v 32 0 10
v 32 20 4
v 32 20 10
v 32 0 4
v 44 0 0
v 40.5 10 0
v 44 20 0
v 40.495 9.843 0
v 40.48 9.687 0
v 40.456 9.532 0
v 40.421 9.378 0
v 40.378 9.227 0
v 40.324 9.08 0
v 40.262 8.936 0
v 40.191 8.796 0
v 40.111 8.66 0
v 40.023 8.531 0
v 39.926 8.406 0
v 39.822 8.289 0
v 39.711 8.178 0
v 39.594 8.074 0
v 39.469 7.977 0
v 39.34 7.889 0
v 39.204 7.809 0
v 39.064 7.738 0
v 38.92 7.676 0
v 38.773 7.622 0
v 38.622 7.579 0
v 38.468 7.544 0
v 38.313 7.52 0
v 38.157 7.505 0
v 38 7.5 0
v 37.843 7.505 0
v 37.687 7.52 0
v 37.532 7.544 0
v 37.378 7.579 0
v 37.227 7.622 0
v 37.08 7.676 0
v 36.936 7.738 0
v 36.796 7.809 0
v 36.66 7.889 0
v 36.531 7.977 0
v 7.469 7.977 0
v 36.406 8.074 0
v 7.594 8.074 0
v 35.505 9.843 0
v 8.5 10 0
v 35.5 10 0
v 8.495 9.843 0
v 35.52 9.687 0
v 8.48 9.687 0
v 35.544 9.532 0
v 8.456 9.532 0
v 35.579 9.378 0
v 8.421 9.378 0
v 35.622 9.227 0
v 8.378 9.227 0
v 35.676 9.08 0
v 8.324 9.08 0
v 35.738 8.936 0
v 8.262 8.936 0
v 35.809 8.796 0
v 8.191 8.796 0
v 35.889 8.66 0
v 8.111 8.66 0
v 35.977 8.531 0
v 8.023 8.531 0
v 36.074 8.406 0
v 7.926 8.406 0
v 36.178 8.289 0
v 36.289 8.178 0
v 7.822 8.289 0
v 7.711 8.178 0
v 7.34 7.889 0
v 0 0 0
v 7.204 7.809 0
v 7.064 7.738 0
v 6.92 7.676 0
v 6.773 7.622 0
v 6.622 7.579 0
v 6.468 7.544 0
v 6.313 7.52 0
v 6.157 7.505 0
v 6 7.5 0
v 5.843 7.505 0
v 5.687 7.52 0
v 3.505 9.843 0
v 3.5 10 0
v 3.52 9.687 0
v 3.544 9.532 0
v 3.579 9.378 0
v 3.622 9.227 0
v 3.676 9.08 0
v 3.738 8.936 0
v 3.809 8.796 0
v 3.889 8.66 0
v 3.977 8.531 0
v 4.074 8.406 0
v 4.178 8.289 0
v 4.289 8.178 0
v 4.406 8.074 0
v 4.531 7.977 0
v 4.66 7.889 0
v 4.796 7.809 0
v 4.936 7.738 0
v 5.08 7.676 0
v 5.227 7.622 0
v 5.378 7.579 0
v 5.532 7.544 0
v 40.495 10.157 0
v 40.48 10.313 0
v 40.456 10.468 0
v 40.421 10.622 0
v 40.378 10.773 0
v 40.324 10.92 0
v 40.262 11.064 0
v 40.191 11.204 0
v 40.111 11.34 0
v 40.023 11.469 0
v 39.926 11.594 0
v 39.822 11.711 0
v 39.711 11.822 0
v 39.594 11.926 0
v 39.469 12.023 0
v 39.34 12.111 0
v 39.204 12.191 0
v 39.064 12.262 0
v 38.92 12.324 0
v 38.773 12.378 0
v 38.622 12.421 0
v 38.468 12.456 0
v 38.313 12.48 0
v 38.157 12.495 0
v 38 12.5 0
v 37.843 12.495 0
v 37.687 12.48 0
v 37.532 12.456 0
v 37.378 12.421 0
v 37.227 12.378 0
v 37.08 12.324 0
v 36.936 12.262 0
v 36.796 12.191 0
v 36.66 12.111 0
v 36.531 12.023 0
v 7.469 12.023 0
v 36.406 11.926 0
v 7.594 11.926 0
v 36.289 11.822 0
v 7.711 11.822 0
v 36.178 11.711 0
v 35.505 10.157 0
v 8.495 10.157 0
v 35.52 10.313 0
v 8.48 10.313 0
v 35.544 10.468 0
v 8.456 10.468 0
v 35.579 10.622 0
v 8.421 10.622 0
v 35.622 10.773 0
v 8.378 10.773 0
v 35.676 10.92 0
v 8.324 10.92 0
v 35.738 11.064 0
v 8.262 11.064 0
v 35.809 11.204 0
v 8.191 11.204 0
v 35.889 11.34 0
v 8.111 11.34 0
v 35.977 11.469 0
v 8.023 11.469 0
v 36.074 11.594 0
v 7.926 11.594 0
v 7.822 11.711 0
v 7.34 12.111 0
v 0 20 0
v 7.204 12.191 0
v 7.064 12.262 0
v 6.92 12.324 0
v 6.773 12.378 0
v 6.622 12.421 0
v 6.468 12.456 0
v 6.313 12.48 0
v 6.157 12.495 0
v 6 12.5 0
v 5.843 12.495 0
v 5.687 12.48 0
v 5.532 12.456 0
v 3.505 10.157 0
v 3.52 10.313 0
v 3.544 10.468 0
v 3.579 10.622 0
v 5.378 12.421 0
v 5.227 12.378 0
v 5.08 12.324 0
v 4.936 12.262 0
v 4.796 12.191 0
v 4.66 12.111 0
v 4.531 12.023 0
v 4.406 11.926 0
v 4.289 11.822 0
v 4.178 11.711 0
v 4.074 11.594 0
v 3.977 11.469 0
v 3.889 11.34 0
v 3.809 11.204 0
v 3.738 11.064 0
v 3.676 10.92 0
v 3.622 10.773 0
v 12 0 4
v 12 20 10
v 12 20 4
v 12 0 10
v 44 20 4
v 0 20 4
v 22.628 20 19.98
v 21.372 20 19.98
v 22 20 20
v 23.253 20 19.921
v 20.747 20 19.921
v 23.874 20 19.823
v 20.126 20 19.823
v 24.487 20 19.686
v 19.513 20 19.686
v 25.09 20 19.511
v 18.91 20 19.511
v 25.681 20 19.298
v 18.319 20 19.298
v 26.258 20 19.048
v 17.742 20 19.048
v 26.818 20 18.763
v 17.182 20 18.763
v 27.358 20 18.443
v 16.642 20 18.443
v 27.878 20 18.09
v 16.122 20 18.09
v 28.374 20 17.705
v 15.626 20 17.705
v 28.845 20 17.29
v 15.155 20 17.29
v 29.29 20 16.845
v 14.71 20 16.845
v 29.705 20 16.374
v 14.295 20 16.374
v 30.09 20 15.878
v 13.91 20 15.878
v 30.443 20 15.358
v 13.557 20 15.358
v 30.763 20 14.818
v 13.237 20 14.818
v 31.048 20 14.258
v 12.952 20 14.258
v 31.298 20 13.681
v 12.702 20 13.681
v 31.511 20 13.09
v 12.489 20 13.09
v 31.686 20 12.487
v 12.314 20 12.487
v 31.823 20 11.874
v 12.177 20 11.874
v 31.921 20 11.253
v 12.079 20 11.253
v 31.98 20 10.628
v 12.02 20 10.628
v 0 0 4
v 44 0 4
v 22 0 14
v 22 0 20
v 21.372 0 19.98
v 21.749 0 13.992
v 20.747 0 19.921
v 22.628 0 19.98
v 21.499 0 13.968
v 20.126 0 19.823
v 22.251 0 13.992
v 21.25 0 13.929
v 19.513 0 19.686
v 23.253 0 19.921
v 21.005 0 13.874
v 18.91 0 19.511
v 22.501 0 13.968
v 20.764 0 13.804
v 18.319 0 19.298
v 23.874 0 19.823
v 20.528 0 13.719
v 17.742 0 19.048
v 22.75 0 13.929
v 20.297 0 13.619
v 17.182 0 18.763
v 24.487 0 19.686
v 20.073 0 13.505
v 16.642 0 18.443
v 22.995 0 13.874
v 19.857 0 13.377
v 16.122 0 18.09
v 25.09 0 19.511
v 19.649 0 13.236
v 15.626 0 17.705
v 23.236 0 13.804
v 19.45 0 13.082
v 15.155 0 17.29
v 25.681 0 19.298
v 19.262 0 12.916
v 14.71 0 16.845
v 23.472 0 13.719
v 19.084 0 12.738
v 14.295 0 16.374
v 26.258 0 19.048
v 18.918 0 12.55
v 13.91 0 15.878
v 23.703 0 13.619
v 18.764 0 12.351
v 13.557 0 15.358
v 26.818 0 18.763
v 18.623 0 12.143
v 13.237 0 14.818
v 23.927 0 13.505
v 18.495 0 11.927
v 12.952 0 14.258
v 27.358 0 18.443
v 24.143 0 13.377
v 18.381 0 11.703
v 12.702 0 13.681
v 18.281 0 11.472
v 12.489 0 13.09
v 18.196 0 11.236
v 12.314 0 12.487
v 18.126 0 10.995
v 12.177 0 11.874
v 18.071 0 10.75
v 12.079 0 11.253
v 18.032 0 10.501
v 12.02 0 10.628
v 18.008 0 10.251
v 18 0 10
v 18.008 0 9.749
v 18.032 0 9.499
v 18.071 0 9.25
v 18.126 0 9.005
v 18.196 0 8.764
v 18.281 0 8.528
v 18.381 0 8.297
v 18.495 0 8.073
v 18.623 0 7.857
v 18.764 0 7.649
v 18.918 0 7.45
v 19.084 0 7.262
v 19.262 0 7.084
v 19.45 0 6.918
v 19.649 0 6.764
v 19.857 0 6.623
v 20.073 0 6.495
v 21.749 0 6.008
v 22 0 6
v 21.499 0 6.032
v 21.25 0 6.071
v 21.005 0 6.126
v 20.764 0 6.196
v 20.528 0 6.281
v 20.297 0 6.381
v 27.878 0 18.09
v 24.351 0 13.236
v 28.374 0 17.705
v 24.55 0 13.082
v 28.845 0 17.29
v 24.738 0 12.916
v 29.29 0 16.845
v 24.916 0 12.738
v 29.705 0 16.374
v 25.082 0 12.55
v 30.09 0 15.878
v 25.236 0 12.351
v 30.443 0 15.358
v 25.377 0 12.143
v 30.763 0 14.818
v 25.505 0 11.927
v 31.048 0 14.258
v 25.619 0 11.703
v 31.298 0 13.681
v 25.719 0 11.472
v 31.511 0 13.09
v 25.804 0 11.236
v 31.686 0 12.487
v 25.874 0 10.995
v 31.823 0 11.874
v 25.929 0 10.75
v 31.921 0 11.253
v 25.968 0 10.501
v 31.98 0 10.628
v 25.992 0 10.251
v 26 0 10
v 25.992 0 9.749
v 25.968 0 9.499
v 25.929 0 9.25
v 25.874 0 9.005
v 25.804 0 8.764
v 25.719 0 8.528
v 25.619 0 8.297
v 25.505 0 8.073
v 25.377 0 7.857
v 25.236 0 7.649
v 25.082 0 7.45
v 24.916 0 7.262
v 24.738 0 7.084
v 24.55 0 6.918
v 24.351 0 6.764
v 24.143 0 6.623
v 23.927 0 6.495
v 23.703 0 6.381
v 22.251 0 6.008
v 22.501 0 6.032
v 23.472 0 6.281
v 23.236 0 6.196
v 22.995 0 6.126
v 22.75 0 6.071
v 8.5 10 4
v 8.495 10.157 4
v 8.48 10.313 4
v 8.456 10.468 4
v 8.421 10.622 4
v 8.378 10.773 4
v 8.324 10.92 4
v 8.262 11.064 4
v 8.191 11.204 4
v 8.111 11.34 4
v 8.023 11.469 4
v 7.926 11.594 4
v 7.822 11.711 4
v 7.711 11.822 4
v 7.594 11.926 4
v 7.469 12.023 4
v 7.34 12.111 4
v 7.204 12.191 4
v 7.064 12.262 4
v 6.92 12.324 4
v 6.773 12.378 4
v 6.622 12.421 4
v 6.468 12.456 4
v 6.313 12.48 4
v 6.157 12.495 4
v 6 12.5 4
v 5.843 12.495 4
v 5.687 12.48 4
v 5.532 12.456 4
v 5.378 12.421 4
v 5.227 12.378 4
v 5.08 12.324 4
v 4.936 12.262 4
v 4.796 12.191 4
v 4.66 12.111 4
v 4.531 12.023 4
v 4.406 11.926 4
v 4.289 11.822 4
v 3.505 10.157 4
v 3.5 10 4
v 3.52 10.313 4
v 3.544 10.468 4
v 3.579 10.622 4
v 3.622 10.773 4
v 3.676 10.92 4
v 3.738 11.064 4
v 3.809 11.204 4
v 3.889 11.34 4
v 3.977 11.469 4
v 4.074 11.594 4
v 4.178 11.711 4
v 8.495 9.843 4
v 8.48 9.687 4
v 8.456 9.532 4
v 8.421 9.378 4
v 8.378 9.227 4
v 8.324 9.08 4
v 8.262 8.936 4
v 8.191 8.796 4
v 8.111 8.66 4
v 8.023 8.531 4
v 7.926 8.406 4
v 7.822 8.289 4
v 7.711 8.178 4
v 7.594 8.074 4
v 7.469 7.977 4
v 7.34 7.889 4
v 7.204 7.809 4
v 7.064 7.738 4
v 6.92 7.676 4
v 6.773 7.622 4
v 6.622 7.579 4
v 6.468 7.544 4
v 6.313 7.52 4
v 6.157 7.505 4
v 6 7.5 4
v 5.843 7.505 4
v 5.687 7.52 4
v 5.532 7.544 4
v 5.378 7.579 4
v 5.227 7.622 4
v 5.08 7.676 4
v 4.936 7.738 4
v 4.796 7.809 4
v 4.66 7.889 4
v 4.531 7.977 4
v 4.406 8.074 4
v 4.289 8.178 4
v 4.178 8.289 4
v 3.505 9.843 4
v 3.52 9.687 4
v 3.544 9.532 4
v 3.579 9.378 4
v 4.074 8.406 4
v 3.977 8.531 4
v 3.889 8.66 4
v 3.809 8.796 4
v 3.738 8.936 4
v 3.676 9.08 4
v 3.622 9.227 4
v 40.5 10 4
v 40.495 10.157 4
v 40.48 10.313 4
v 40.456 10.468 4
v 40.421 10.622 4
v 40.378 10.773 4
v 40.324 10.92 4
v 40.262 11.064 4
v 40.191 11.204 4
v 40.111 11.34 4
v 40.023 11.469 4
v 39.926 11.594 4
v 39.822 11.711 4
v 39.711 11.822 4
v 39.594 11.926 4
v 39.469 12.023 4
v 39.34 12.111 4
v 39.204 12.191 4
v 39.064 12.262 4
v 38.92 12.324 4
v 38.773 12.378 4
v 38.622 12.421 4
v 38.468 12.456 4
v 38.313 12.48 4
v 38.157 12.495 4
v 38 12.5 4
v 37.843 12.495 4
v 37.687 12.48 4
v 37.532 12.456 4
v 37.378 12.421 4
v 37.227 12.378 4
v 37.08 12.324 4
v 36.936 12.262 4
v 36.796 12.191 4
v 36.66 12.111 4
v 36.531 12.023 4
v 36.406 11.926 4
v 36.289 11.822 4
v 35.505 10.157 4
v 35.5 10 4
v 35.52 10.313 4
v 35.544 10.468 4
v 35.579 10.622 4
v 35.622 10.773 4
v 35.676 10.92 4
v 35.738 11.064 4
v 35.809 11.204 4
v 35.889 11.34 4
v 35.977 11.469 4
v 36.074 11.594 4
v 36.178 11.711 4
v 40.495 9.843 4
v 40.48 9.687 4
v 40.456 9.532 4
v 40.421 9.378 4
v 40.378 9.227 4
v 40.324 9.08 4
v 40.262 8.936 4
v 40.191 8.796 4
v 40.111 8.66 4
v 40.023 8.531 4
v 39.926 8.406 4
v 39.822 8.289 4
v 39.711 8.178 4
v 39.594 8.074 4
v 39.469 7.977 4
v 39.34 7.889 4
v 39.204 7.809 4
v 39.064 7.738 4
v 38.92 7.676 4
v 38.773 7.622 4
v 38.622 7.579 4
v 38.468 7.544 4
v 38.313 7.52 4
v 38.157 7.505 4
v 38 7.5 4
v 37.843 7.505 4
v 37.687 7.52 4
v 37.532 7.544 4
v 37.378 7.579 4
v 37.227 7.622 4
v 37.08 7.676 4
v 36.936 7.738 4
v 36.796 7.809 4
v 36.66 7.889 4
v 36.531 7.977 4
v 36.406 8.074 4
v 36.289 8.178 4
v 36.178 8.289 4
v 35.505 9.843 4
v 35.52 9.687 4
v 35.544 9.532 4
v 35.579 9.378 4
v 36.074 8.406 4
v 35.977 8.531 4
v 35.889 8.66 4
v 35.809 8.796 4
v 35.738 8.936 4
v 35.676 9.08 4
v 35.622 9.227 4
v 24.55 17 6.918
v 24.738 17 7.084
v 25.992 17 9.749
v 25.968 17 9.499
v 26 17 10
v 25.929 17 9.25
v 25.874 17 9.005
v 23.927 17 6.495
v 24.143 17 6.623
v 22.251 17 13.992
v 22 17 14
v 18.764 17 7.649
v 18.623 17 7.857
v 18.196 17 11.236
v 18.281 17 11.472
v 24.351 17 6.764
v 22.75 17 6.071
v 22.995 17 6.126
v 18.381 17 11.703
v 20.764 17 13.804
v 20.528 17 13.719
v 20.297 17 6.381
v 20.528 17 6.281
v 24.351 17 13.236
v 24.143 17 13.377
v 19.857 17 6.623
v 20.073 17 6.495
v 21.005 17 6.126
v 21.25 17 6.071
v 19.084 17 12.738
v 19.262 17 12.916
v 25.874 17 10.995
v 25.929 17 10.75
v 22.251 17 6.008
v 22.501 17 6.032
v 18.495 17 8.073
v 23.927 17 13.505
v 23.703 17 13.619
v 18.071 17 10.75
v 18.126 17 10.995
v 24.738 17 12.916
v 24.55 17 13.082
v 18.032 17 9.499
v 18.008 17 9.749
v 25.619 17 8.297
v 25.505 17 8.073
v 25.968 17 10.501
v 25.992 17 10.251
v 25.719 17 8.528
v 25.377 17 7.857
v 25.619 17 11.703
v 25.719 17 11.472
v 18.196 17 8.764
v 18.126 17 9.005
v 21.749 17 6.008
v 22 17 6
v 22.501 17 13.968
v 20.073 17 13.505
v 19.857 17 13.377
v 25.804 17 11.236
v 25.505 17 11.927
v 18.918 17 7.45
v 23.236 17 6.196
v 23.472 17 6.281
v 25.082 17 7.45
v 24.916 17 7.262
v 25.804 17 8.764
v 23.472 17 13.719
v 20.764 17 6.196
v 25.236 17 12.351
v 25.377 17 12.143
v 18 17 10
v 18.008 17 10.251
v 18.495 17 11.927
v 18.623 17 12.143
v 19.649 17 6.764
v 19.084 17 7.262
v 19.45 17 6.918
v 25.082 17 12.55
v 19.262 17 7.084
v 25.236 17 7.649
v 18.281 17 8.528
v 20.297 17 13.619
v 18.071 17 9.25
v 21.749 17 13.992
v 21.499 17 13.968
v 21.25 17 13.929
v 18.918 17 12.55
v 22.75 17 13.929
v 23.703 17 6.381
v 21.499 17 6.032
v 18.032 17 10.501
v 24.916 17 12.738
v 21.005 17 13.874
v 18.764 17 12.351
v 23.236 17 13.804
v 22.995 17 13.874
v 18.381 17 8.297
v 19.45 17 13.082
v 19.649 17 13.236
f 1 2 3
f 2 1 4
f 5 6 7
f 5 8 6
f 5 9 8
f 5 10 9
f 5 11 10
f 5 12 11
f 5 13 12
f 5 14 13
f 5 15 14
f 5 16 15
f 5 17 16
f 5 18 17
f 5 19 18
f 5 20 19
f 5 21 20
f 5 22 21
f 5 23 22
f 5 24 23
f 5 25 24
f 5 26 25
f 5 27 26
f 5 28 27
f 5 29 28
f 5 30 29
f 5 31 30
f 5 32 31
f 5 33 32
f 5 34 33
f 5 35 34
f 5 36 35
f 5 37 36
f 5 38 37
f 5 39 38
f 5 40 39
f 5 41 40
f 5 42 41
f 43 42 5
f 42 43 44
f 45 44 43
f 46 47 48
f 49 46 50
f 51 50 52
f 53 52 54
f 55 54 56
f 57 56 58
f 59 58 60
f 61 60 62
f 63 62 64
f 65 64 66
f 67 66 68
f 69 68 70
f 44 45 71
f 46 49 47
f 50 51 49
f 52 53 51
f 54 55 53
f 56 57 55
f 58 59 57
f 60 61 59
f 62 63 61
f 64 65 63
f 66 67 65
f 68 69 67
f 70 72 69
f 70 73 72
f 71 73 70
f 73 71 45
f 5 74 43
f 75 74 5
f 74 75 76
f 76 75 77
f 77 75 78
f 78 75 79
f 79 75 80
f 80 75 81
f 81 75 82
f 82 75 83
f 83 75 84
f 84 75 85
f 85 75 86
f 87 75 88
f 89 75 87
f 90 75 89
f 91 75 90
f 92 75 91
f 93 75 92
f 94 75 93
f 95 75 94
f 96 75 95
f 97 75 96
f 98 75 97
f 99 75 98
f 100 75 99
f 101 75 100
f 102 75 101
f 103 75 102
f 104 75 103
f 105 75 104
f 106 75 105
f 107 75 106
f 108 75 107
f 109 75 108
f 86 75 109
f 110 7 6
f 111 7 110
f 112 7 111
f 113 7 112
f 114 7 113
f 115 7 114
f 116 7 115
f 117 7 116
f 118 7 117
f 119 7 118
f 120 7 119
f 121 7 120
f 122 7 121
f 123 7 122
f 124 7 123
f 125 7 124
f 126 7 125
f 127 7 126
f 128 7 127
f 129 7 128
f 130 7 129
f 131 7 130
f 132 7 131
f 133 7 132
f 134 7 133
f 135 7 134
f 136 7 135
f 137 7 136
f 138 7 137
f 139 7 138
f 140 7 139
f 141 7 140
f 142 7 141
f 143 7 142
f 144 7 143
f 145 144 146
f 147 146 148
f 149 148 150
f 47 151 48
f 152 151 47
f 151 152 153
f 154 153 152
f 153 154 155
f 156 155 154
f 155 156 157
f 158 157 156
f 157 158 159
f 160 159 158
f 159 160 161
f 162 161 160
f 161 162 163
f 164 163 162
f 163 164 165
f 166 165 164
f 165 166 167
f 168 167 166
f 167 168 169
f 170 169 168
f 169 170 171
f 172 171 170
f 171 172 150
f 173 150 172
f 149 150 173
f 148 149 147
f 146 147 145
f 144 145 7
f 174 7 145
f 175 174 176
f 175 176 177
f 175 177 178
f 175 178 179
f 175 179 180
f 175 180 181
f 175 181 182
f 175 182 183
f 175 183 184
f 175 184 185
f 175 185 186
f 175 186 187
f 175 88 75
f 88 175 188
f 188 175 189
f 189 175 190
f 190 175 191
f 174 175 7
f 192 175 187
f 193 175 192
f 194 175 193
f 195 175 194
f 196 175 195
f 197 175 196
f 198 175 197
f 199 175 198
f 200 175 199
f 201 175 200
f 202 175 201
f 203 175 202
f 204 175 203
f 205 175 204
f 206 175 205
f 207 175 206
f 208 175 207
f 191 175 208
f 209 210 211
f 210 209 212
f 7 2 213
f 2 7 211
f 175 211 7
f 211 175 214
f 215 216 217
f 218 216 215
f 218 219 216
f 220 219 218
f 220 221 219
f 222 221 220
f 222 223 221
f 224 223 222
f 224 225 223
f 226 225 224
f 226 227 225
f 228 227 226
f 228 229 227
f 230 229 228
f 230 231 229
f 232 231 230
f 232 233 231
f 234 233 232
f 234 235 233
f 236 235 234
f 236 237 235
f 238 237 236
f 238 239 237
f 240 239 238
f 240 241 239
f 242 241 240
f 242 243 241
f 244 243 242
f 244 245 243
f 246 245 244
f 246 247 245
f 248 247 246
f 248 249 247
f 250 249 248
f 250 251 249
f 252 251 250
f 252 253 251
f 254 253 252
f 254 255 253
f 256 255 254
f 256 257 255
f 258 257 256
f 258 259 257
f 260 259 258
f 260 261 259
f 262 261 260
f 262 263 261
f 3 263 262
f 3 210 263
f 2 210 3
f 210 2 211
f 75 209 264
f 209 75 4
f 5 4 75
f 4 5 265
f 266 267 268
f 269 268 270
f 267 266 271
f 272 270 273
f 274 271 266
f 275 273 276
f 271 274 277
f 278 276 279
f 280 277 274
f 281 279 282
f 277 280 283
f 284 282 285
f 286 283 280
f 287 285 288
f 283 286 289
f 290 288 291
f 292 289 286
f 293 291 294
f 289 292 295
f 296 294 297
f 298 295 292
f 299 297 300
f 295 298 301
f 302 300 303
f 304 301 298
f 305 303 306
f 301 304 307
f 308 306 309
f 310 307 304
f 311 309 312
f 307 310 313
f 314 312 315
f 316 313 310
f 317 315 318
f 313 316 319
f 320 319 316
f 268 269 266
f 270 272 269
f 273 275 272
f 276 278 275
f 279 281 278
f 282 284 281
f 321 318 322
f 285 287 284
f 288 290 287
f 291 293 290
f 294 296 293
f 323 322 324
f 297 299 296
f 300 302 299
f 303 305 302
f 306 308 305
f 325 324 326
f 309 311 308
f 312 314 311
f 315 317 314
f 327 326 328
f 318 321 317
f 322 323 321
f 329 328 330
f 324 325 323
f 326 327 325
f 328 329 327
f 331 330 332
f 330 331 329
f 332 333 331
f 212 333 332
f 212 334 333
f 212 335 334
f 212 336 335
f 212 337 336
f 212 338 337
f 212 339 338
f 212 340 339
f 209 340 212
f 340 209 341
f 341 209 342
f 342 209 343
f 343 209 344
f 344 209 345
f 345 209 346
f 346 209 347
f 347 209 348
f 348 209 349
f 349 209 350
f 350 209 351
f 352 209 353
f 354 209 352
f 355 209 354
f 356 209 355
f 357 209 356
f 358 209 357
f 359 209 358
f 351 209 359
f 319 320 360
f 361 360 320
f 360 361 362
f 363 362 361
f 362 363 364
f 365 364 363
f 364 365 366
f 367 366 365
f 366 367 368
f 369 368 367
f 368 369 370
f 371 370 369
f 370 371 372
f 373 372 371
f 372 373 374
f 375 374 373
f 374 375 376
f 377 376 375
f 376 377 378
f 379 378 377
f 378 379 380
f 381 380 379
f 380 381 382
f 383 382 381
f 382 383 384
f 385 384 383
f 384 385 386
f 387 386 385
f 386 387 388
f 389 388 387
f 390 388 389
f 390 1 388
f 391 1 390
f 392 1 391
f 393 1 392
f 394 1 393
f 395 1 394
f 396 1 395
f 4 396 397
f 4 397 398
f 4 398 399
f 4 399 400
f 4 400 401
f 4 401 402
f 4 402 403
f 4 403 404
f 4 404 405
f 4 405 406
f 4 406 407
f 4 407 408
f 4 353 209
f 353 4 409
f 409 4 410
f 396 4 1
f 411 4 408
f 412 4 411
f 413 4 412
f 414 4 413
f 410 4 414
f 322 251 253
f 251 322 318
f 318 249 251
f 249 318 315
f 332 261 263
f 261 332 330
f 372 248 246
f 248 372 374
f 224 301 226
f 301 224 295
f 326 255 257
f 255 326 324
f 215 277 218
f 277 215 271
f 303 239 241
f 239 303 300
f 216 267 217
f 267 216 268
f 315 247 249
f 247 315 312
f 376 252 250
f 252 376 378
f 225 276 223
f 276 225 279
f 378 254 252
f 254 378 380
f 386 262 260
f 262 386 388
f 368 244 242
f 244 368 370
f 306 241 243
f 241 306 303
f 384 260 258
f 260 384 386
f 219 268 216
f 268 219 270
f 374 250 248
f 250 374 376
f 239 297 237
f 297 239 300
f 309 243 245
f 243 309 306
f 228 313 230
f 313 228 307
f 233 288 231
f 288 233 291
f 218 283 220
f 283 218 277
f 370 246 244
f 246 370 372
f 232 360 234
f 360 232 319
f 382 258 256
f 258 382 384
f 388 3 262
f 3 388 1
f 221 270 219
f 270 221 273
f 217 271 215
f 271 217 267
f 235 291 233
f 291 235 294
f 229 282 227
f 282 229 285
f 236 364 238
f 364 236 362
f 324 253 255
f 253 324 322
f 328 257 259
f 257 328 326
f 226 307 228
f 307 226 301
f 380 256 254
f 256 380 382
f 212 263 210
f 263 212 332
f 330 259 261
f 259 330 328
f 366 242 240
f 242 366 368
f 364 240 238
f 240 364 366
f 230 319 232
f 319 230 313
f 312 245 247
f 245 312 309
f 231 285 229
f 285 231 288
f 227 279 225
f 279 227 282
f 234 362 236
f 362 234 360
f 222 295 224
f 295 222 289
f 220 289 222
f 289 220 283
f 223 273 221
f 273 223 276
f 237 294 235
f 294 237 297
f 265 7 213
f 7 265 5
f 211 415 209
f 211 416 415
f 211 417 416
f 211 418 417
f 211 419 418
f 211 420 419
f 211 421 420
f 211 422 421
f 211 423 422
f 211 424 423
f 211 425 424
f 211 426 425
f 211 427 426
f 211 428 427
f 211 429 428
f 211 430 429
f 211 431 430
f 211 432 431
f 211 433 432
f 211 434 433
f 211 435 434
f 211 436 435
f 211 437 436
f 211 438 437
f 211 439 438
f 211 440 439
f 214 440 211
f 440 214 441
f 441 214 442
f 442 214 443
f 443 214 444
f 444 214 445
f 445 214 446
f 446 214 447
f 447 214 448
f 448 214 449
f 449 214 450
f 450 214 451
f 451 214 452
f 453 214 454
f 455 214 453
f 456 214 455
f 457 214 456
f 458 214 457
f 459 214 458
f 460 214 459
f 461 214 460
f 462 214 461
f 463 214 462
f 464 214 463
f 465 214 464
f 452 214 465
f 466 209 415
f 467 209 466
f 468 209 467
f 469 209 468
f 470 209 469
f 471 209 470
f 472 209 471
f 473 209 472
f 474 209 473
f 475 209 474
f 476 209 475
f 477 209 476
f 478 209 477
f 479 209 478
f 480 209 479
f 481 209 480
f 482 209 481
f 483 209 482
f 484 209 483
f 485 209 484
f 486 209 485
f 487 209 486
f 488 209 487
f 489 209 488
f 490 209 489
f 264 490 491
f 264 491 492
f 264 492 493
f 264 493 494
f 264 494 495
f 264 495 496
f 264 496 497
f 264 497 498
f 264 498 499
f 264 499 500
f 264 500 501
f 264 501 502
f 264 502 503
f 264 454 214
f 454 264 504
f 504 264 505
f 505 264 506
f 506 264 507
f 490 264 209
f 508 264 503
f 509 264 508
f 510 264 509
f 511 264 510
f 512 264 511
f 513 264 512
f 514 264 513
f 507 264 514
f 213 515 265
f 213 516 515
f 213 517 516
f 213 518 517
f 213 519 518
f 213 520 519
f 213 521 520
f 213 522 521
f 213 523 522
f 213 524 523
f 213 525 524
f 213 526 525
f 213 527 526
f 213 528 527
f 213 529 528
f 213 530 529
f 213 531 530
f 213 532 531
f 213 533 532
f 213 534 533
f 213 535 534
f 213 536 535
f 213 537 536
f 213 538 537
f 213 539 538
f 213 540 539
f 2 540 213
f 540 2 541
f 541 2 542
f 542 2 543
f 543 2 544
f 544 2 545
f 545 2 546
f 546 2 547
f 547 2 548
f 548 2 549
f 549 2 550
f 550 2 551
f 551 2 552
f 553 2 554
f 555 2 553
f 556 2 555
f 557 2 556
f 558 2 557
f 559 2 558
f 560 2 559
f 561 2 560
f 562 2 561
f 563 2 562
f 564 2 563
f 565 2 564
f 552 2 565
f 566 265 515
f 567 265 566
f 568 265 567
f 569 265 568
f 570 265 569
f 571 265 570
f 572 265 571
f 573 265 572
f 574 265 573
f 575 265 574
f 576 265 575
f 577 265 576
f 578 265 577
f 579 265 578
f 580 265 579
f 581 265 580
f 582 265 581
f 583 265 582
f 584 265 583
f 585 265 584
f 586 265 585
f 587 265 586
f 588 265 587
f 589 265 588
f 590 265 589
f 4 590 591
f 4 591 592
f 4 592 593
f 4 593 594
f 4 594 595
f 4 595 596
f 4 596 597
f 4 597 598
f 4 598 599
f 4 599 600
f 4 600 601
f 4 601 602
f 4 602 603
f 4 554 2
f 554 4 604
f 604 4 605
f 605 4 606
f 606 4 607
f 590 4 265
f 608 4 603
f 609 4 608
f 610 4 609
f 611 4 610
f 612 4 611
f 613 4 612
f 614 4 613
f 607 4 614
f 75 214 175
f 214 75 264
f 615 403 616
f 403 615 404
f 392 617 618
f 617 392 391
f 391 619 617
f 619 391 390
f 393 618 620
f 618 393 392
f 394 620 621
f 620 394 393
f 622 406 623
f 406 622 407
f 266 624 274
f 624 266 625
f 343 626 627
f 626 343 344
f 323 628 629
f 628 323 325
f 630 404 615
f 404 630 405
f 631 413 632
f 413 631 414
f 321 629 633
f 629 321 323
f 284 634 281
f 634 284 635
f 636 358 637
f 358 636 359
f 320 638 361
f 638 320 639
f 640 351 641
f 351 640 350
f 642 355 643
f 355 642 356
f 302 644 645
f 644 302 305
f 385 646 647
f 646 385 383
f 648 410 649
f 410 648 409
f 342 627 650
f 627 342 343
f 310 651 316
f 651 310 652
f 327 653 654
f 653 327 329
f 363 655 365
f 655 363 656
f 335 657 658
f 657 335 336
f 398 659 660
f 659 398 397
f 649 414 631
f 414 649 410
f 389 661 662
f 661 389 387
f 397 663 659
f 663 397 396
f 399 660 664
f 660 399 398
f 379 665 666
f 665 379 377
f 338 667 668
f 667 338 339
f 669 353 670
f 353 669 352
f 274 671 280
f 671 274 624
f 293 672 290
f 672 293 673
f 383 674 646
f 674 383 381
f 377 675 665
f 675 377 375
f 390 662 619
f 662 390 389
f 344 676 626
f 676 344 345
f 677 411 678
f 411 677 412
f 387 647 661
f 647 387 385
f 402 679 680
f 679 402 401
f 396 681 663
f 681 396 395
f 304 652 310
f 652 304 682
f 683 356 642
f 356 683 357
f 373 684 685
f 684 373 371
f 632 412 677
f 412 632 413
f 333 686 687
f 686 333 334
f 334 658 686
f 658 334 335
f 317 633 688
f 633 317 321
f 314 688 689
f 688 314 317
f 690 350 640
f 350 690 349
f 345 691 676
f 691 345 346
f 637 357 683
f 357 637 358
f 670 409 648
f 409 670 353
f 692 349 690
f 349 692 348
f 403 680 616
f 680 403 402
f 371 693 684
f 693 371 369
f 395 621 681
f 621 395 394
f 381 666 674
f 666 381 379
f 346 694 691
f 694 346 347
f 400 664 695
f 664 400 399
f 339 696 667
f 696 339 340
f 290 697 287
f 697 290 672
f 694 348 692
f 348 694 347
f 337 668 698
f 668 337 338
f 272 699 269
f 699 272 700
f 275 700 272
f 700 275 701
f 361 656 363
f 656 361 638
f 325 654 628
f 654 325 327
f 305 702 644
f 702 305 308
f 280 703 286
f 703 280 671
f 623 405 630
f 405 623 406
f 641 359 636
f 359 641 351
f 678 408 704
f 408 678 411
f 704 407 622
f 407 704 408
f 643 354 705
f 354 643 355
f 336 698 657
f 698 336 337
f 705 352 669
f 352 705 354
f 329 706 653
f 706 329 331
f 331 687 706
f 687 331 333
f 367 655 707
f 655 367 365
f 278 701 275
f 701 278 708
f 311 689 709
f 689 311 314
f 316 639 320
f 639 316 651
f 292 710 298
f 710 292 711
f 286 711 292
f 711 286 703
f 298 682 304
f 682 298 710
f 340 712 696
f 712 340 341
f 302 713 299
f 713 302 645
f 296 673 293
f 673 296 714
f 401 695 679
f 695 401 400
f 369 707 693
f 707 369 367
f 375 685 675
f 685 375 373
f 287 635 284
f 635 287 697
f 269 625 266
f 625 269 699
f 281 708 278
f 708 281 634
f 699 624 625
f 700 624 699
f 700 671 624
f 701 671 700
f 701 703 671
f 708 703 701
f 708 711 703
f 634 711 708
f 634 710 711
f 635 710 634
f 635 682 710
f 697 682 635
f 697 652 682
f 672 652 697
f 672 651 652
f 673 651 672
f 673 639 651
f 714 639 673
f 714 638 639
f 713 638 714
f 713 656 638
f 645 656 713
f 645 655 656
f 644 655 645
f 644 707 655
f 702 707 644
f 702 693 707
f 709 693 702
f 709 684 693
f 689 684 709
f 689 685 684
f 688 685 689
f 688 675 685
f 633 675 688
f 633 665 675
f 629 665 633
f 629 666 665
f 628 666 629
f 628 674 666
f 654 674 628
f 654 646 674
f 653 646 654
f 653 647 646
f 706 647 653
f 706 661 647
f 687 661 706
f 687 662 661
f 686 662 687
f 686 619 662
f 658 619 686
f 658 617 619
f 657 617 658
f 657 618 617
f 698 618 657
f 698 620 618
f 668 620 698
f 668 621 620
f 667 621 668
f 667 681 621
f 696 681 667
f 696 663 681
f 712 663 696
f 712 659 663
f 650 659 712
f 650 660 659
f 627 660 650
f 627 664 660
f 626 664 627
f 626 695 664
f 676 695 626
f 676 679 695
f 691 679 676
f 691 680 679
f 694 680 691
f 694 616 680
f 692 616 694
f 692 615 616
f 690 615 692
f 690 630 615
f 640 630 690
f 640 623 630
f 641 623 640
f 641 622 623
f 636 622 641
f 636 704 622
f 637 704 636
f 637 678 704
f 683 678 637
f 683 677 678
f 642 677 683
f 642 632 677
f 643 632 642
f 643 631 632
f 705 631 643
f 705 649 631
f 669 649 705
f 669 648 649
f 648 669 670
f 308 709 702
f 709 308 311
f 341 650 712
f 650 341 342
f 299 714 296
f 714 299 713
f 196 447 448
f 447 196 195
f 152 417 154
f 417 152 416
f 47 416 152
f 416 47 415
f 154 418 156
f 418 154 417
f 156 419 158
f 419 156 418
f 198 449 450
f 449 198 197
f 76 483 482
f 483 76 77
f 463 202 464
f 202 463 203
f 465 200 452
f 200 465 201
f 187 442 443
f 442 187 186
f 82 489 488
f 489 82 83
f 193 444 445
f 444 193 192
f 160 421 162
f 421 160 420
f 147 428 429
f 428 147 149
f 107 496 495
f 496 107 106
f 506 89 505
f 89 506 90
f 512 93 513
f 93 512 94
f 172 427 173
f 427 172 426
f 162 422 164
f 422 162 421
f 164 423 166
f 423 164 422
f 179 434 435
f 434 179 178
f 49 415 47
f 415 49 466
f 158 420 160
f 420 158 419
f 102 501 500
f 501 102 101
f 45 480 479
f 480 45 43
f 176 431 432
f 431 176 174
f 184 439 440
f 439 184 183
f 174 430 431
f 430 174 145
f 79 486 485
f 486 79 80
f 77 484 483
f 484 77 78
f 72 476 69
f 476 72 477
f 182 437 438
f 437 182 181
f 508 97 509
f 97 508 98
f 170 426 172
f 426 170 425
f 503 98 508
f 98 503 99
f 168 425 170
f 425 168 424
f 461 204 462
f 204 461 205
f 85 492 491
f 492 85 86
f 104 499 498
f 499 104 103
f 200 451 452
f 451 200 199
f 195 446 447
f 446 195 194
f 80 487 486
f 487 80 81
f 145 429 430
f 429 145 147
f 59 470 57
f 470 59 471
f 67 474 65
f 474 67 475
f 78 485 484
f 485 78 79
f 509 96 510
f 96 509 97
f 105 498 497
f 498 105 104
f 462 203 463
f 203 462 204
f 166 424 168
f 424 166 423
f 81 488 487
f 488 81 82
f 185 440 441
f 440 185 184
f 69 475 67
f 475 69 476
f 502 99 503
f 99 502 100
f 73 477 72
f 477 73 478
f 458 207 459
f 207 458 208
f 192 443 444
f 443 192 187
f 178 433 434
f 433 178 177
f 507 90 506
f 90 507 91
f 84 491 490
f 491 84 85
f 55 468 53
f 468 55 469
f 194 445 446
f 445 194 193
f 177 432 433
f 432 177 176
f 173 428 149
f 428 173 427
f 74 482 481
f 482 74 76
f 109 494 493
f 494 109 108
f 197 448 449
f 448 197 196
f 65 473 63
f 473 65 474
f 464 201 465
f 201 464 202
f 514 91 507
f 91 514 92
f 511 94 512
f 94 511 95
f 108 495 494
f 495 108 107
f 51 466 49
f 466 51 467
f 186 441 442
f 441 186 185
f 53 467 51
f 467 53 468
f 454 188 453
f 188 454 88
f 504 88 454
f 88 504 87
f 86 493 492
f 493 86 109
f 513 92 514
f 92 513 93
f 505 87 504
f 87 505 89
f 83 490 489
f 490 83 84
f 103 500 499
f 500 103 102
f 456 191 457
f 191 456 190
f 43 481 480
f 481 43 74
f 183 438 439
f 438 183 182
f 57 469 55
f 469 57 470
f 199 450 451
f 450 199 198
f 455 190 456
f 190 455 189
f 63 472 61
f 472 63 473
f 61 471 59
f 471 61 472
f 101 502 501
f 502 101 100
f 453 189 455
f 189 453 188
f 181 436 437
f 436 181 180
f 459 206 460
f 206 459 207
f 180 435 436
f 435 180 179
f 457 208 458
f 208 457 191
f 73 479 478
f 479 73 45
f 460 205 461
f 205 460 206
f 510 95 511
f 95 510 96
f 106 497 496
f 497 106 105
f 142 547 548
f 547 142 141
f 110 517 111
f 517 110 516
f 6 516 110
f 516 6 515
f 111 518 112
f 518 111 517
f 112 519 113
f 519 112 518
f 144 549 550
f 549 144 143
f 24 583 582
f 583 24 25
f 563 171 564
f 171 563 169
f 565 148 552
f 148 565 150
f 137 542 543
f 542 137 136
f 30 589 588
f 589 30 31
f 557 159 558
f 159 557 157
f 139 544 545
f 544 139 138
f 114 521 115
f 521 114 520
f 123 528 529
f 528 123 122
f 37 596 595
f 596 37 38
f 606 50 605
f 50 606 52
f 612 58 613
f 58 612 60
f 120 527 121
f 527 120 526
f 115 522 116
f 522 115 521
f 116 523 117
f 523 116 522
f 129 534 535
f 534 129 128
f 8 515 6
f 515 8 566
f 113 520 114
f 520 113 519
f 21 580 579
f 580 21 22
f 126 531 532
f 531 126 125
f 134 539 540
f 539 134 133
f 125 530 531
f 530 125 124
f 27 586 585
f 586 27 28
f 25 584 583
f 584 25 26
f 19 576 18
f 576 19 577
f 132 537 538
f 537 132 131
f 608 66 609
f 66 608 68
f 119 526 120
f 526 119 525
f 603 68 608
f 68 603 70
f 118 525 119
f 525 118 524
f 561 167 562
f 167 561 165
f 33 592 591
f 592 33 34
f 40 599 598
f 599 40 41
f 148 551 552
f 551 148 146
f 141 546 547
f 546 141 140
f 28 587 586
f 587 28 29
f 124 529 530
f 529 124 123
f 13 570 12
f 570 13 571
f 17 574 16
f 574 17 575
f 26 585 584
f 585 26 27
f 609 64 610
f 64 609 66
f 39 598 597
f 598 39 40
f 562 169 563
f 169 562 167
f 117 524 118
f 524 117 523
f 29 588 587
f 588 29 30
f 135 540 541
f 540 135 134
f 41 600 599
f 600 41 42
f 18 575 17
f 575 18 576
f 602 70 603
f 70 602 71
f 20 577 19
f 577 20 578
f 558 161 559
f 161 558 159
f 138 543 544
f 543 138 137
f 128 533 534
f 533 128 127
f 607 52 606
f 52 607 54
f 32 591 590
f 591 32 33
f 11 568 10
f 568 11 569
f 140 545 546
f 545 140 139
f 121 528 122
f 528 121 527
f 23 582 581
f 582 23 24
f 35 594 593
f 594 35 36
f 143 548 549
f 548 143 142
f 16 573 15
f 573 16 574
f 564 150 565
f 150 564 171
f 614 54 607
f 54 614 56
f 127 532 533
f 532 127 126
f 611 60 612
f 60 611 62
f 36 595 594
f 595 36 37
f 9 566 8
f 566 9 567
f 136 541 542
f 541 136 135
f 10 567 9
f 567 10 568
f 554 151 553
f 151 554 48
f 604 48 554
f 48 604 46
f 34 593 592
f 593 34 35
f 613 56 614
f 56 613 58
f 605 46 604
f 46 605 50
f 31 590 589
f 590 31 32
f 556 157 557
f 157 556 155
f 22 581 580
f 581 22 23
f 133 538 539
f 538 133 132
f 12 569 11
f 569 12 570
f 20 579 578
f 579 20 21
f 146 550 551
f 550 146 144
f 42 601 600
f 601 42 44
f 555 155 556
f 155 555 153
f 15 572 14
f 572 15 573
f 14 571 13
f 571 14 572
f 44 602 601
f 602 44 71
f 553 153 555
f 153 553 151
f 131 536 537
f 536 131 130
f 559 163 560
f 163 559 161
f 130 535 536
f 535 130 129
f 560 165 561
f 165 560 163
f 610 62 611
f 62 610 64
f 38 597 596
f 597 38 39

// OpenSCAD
// file: functions.scad
/**********************************
	File: functions.scad
	Revision: 0.1 (10/7/2012)
	OpenSCAD version by:
	Michael Williams (gannon)
	mswillia@mtu.edu
**********************************/
include <config.scad>

//Drill a hole the given depth at the given location
module drill(x,y,radius,depth) {
	translate([x,y,-overdrill])
		cylinder(r=radius,h=depth,$fn=100);
}

module roundedcorner(radius,thickness,angle) {
	rotate([0,0,angle])
		translate([-radius+overdrill,-radius+overdrill,-overdrill])
			difference() {
				translate([-overdrill,-overdrill,0])
					cube([radius+overdrill,radius+overdrill,thickness+overdrill*2]);
				cylinder(r=radius,h=thickness+overdrill*2, $fn=100);
			}
}

//Usage: points is an array consisting of elements
//[x,y,r] for each point of the polygon
//Please note that x and y will be the centers
//of the rounded edges! Outside wall will be
//r away at some angle.
//Ideally I will make a function that will find
//the place to put the circle of a given radius
//based off of the points in the polygon.
module multiradiusroundedpoly(points,height) {
	linear_extrude(height=height)
		hull()
			for (p = points) {
				translate([p[0],p[1],0])
					circle(r=p[2],$fn=100);
			}
}
// file: config.scad
/**********************************
	File: config.scad
	Revision: 0.2 (1/5/2013)
	OpenSCAD version by:
	Michael Williams (gannon)
	mswillia@mtu.edu
**********************************/

/**********************************
		CONFIGURATION
**********************************/
//This is for the depth of holes so OpenSCAD renders correctly.
overdrill=0.1;

//LM10UU
linear_bearing_length=29;
linear_bearing_ID=10;
linear_bearing_OD=19.4;//19

//HFSB5-2020 extrusions
extrusion_height=20;
extrusion_width=20;
extrusion_wall=3.2;
extrusion_opening=5.4;

//Large rods
smooth_rod_diameter=10;
threaded_rod_diameter=8;

//608zz
skate_bearings_length=7;
skate_bearings_ID=8;
skate_bearings_OD=22;

//Belt configuration
belt_width=8;
belt_depth=1;

/*
3/8"-12 acme rod
m8 threaded rod
*/

spring_OD=6;

screw_a_diameter=3;
screw_b_diameter=4;
screw_c_diameter=5;
screw_d_diameter=8;

/**********************************
		END CONFIGURATION
**********************************/
// main file
/**********************************
	File: Y_FrameConnectorB.scad
	Revision: 0.1 (2/2/2012)
	OpenSCAD version by:
	Michael Williams (gannon)
	mswillia@mtu.edu
**********************************/
include <config.scad>
use <functions.scad>
/**********************************
		CONFIGURATION
**********************************/
//Base size
base=[44,20,4];

/**********************************
		END CONFIGURATION
**********************************/
difference() {
	union() {
		cube(base);
		translate([base[0]/2-smooth_rod_diameter,0,0]) {
			cube([smooth_rod_diameter*2,base[1],smooth_rod_diameter]);
			translate([smooth_rod_diameter,0,smooth_rod_diameter])
				rotate([-90,0,0])
					cylinder(r=smooth_rod_diameter,h=base[1],$fn=100);

		}
	}
	translate([base[0]/2,-overdrill,smooth_rod_diameter])
		rotate([-90,0,0])
			cylinder(r=screw_d_diameter/2,h=17+overdrill,$fn=100);
	drill(6,base[1]/2,screw_c_diameter/2,base[2]+overdrill*2);
	drill(base[0]-6,base[1]/2,screw_c_diameter/2,base[2]+overdrill*2);
}
